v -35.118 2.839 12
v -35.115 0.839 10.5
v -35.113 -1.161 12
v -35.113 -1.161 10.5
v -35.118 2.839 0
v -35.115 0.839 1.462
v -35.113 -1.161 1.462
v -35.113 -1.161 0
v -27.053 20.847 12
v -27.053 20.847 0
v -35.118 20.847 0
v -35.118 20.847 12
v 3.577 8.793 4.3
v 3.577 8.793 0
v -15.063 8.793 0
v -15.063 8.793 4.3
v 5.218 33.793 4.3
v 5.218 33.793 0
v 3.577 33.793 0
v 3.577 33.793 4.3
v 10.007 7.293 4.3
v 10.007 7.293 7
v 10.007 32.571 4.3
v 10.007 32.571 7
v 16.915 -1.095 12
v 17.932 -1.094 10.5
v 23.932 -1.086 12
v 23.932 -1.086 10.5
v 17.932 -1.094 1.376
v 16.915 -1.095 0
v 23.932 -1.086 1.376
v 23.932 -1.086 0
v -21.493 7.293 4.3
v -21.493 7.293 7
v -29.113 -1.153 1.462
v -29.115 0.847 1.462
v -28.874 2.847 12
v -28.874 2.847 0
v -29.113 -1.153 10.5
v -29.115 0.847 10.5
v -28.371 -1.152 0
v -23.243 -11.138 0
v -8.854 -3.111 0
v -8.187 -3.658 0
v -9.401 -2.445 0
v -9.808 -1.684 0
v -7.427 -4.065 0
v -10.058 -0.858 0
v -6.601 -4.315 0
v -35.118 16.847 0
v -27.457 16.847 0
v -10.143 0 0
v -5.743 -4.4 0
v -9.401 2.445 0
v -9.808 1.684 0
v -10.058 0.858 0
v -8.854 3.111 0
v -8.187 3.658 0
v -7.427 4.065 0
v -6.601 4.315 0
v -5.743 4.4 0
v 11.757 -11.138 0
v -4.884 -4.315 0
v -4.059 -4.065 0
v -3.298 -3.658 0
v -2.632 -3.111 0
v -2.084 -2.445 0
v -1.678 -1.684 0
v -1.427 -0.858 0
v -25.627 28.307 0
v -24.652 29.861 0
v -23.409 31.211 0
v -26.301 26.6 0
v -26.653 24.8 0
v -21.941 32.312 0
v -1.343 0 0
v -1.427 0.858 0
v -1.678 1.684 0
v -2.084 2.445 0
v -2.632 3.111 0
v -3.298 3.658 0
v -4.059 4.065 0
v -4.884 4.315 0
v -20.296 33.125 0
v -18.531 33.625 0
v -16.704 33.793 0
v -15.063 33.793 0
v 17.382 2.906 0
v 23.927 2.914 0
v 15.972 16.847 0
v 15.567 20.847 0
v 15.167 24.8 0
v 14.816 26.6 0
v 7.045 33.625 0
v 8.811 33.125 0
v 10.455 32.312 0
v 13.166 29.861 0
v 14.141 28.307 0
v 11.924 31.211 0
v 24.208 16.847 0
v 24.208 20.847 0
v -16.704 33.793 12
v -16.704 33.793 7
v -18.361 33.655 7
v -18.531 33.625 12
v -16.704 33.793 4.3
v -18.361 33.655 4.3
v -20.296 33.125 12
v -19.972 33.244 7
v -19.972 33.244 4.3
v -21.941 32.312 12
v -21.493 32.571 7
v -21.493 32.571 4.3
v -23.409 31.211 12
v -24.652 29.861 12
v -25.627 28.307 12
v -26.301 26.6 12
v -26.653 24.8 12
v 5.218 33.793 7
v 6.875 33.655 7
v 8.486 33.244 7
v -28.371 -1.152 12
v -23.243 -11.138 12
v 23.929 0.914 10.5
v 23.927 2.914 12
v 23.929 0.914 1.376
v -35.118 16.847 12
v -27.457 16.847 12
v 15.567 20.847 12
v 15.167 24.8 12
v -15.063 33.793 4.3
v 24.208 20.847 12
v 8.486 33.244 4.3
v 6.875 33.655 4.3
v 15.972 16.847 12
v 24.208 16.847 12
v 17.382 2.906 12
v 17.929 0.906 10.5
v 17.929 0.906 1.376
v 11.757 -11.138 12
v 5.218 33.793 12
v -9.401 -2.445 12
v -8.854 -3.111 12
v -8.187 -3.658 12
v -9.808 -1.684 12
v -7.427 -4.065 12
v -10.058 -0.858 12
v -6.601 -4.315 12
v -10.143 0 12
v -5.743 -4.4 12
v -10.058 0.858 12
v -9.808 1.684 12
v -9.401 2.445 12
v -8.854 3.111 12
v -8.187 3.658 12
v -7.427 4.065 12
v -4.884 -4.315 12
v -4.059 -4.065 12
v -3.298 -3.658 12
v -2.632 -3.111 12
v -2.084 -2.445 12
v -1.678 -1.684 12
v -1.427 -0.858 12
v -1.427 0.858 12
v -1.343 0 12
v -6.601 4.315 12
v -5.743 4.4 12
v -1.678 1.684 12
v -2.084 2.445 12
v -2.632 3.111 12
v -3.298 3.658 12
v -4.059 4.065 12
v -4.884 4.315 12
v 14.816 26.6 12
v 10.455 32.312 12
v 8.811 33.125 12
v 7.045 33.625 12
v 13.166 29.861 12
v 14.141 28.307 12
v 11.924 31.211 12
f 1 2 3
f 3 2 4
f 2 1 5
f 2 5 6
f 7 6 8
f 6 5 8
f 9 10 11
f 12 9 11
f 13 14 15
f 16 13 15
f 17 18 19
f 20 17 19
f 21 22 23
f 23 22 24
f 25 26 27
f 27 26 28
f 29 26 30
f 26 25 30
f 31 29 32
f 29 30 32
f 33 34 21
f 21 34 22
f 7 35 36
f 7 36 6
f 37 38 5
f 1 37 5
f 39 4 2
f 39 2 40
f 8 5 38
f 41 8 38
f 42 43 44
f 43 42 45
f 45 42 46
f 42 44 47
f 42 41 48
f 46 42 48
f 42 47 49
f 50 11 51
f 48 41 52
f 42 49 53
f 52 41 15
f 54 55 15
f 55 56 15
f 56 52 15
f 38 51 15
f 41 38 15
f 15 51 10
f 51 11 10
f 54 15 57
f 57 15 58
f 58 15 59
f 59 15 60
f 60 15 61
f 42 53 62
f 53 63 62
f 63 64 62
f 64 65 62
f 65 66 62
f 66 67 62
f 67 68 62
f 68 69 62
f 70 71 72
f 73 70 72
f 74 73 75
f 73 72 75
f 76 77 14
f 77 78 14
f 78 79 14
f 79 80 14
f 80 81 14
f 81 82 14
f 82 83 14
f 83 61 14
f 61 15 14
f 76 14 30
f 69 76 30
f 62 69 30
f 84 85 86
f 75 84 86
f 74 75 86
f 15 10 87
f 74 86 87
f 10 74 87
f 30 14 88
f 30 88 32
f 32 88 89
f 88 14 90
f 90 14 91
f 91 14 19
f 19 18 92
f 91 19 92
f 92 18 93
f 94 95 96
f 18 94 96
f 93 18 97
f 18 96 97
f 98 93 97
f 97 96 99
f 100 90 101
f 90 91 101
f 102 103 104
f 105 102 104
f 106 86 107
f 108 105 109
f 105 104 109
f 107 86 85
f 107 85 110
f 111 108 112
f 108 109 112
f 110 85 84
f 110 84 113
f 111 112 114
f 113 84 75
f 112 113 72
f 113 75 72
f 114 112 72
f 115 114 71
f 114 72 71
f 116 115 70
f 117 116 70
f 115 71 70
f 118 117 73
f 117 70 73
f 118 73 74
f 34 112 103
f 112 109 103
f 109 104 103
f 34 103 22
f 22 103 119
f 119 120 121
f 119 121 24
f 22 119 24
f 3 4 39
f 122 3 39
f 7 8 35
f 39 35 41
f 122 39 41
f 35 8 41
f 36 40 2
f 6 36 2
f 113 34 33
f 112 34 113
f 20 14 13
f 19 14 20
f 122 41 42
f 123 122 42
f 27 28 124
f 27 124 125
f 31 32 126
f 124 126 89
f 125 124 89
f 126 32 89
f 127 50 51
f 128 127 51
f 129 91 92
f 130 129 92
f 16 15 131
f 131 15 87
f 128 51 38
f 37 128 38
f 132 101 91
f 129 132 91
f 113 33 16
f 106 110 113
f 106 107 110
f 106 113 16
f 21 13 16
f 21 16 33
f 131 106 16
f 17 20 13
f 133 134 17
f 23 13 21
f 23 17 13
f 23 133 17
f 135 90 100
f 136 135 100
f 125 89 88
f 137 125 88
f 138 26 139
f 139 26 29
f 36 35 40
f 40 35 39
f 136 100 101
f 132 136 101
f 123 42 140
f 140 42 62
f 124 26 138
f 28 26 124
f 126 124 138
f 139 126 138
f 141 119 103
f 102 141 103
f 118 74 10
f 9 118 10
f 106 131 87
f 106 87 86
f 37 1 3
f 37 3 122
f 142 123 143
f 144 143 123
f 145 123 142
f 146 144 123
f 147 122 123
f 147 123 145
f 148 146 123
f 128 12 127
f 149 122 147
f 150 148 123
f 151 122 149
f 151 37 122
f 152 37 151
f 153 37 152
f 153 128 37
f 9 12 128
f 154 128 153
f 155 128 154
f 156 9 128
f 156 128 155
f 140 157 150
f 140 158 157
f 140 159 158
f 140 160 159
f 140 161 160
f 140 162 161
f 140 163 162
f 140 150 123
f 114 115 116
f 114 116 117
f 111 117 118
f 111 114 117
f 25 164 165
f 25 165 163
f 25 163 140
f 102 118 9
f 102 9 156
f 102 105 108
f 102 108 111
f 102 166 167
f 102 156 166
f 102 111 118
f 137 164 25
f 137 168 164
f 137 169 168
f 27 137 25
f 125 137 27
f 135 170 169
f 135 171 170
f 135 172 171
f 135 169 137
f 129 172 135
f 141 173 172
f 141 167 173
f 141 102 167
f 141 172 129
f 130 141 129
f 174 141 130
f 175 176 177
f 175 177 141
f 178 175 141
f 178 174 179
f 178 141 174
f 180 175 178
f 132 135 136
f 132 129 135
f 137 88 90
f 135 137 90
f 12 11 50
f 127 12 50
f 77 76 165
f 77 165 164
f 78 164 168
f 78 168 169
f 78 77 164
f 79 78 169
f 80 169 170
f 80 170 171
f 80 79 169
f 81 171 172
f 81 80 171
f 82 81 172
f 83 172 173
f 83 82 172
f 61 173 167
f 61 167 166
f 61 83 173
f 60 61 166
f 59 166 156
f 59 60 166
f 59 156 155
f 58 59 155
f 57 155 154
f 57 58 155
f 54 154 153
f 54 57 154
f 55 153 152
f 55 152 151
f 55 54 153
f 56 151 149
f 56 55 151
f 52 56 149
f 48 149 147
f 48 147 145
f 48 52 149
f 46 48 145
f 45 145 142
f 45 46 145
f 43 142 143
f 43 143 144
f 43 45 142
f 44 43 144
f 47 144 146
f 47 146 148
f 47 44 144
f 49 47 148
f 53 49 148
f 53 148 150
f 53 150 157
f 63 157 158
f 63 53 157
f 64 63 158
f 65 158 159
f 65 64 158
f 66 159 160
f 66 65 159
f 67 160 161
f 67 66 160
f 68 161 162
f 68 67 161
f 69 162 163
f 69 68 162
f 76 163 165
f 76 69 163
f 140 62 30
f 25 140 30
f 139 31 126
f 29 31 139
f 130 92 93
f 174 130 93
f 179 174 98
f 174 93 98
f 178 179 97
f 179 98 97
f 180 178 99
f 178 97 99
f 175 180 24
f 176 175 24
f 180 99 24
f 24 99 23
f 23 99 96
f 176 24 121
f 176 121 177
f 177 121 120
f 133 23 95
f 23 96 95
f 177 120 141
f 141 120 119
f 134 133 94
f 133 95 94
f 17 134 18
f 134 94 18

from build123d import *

# Parameters (mm, degrees)
SKETCH2_R           = 4.4
BOSS_EXTRUDE1_DEPTH = 12
CUT_EXTRUDE1_DEPTH  = 2
SKETCH4_W           = 31.5
SKETCH4_H           = 26.5
CUT_EXTRUDE2_DEPTH  = 2.7
CUT_EXTRUDE3_REACH  = 14
SKETCH5_W           = 18.640557444
SKETCH5_H           = 25


with BuildPart() as part:
    # Sketch2 → Boss-Extrude1 (new body)
    with BuildSketch(Plane.XY):
        with BuildLine():
            Line((-26.652708458, 24.799544054), (-27.052594325, 20.847218157))
            Line((-27.052594325, 20.847218157), (-35.117996865, 20.847218157))
            Line((-35.117996865, 20.847218157), (-35.117996865, 16.847218157))
            Line((-35.117996865, 16.847218157), (-27.457303732, 16.847218157))
            Line((-27.457303732, 16.847218157), (-28.873786654, 2.847218157))
            Line((-28.873786654, 2.847218157), (-35.117996865, 2.839337807))
            Line((-35.117996865, 2.839337807), (-35.112948764, -1.160662193))
            Line((-35.112948764, -1.160662193), (-28.37093921, -1.152153607))
            Line((-28.37093921, -1.152153607), (-23.24278353, -11.137592085))
            Line((-23.24278353, -11.137592085), (11.75721647, -11.137592085))
            Line((11.75721647, -11.137592085), (16.91451101, -1.09500223))
            Line((16.91451101, -1.09500223), (23.93161739, -1.086146466))
            Line((23.93161739, -1.086146466), (23.92656929, 2.913853534))
            Line((23.92656929, 2.913853534), (17.382313229, 2.905594519))
            Line((17.382313229, 2.905594519), (15.971736672, 16.847218157))
            Line((15.971736672, 16.847218157), (24.207665477, 16.847218157))
            Line((24.207665477, 16.847218157), (24.207665477, 20.847218157))
            Line((24.207665477, 20.847218157), (15.567027266, 20.847218157))
            Line((15.567027266, 20.847218157), (15.167141399, 24.799544054))
            ThreePointArc((15.167141399, 24.799544054), (11.923667067, 31.21134436), (5.217936029, 33.792909804))
            Line((5.217936029, 33.792909804), (-16.703503089, 33.792909804))
            ThreePointArc((-16.703503089, 33.792909804), (-23.409234126, 31.21134436), (-26.652708458, 24.799544054))
        make_face()
        with Locations((-5.74278353, 0)):
            Circle(SKETCH2_R, mode=Mode.SUBTRACT)
    extrude(amount=BOSS_EXTRUDE1_DEPTH)

    # Sketch3 → Cut-Extrude1 (cut)
    with BuildSketch(Plane(origin=(0.001408858, -1.116346991, 0), x_dir=(0.999999204, 0.001262024, 0), z_dir=(0.001262024, -0.999999204, 0))):
        Polygon((-35.114385586, 10.5), (-29.114385586, 10.5), (-29.114385586, 8.5), (-29.114385586, 3.523848556), (-29.114385586, 1.461924081), (-35.114385586, 1.461924081), (-35.114385586, 3.523848556), (-35.114385586, 8.5), align=None)
        Polygon((17.930227589, 10.5), (23.930227589, 10.5), (23.930227589, 8.5), (23.930227589, 3.438075525), (23.930227589, 1.376151049), (17.930227589, 1.376151049), (17.930227589, 3.438075525), (17.930227589, 8.5), align=None)
    extrude(amount=-CUT_EXTRUDE1_DEPTH, mode=Mode.SUBTRACT)

    # Sketch4 → Cut-Extrude2 (cut)
    with BuildSketch(Plane.XY.offset(7)):
        with Locations((-5.74278353, 20.542909804)):
            Rectangle(SKETCH4_W, SKETCH4_H)
    extrude(amount=-CUT_EXTRUDE2_DEPTH, mode=Mode.SUBTRACT)

    # Sketch5 → Cut-Extrude3 (cut, up to next)
    with BuildSketch(Plane(origin=(0, 0, 0), x_dir=(-1, 0, 0), z_dir=(0, 0, -1)), mode=Mode.PRIVATE) as cut_extrude3_sk1:
        with Locations((5.74278353, 21.292909804)):
            Rectangle(SKETCH5_W, SKETCH5_H)
    cut_extrude3_tool1 = extrude(cut_extrude3_sk1.sketch, amount=-CUT_EXTRUDE3_REACH, mode=Mode.PRIVATE) & part.part
    add(cut_extrude3_tool1.solids().sort_by_distance((-5.742784, 21.29291, 0))[0], mode=Mode.SUBTRACT)


solid = part.part
